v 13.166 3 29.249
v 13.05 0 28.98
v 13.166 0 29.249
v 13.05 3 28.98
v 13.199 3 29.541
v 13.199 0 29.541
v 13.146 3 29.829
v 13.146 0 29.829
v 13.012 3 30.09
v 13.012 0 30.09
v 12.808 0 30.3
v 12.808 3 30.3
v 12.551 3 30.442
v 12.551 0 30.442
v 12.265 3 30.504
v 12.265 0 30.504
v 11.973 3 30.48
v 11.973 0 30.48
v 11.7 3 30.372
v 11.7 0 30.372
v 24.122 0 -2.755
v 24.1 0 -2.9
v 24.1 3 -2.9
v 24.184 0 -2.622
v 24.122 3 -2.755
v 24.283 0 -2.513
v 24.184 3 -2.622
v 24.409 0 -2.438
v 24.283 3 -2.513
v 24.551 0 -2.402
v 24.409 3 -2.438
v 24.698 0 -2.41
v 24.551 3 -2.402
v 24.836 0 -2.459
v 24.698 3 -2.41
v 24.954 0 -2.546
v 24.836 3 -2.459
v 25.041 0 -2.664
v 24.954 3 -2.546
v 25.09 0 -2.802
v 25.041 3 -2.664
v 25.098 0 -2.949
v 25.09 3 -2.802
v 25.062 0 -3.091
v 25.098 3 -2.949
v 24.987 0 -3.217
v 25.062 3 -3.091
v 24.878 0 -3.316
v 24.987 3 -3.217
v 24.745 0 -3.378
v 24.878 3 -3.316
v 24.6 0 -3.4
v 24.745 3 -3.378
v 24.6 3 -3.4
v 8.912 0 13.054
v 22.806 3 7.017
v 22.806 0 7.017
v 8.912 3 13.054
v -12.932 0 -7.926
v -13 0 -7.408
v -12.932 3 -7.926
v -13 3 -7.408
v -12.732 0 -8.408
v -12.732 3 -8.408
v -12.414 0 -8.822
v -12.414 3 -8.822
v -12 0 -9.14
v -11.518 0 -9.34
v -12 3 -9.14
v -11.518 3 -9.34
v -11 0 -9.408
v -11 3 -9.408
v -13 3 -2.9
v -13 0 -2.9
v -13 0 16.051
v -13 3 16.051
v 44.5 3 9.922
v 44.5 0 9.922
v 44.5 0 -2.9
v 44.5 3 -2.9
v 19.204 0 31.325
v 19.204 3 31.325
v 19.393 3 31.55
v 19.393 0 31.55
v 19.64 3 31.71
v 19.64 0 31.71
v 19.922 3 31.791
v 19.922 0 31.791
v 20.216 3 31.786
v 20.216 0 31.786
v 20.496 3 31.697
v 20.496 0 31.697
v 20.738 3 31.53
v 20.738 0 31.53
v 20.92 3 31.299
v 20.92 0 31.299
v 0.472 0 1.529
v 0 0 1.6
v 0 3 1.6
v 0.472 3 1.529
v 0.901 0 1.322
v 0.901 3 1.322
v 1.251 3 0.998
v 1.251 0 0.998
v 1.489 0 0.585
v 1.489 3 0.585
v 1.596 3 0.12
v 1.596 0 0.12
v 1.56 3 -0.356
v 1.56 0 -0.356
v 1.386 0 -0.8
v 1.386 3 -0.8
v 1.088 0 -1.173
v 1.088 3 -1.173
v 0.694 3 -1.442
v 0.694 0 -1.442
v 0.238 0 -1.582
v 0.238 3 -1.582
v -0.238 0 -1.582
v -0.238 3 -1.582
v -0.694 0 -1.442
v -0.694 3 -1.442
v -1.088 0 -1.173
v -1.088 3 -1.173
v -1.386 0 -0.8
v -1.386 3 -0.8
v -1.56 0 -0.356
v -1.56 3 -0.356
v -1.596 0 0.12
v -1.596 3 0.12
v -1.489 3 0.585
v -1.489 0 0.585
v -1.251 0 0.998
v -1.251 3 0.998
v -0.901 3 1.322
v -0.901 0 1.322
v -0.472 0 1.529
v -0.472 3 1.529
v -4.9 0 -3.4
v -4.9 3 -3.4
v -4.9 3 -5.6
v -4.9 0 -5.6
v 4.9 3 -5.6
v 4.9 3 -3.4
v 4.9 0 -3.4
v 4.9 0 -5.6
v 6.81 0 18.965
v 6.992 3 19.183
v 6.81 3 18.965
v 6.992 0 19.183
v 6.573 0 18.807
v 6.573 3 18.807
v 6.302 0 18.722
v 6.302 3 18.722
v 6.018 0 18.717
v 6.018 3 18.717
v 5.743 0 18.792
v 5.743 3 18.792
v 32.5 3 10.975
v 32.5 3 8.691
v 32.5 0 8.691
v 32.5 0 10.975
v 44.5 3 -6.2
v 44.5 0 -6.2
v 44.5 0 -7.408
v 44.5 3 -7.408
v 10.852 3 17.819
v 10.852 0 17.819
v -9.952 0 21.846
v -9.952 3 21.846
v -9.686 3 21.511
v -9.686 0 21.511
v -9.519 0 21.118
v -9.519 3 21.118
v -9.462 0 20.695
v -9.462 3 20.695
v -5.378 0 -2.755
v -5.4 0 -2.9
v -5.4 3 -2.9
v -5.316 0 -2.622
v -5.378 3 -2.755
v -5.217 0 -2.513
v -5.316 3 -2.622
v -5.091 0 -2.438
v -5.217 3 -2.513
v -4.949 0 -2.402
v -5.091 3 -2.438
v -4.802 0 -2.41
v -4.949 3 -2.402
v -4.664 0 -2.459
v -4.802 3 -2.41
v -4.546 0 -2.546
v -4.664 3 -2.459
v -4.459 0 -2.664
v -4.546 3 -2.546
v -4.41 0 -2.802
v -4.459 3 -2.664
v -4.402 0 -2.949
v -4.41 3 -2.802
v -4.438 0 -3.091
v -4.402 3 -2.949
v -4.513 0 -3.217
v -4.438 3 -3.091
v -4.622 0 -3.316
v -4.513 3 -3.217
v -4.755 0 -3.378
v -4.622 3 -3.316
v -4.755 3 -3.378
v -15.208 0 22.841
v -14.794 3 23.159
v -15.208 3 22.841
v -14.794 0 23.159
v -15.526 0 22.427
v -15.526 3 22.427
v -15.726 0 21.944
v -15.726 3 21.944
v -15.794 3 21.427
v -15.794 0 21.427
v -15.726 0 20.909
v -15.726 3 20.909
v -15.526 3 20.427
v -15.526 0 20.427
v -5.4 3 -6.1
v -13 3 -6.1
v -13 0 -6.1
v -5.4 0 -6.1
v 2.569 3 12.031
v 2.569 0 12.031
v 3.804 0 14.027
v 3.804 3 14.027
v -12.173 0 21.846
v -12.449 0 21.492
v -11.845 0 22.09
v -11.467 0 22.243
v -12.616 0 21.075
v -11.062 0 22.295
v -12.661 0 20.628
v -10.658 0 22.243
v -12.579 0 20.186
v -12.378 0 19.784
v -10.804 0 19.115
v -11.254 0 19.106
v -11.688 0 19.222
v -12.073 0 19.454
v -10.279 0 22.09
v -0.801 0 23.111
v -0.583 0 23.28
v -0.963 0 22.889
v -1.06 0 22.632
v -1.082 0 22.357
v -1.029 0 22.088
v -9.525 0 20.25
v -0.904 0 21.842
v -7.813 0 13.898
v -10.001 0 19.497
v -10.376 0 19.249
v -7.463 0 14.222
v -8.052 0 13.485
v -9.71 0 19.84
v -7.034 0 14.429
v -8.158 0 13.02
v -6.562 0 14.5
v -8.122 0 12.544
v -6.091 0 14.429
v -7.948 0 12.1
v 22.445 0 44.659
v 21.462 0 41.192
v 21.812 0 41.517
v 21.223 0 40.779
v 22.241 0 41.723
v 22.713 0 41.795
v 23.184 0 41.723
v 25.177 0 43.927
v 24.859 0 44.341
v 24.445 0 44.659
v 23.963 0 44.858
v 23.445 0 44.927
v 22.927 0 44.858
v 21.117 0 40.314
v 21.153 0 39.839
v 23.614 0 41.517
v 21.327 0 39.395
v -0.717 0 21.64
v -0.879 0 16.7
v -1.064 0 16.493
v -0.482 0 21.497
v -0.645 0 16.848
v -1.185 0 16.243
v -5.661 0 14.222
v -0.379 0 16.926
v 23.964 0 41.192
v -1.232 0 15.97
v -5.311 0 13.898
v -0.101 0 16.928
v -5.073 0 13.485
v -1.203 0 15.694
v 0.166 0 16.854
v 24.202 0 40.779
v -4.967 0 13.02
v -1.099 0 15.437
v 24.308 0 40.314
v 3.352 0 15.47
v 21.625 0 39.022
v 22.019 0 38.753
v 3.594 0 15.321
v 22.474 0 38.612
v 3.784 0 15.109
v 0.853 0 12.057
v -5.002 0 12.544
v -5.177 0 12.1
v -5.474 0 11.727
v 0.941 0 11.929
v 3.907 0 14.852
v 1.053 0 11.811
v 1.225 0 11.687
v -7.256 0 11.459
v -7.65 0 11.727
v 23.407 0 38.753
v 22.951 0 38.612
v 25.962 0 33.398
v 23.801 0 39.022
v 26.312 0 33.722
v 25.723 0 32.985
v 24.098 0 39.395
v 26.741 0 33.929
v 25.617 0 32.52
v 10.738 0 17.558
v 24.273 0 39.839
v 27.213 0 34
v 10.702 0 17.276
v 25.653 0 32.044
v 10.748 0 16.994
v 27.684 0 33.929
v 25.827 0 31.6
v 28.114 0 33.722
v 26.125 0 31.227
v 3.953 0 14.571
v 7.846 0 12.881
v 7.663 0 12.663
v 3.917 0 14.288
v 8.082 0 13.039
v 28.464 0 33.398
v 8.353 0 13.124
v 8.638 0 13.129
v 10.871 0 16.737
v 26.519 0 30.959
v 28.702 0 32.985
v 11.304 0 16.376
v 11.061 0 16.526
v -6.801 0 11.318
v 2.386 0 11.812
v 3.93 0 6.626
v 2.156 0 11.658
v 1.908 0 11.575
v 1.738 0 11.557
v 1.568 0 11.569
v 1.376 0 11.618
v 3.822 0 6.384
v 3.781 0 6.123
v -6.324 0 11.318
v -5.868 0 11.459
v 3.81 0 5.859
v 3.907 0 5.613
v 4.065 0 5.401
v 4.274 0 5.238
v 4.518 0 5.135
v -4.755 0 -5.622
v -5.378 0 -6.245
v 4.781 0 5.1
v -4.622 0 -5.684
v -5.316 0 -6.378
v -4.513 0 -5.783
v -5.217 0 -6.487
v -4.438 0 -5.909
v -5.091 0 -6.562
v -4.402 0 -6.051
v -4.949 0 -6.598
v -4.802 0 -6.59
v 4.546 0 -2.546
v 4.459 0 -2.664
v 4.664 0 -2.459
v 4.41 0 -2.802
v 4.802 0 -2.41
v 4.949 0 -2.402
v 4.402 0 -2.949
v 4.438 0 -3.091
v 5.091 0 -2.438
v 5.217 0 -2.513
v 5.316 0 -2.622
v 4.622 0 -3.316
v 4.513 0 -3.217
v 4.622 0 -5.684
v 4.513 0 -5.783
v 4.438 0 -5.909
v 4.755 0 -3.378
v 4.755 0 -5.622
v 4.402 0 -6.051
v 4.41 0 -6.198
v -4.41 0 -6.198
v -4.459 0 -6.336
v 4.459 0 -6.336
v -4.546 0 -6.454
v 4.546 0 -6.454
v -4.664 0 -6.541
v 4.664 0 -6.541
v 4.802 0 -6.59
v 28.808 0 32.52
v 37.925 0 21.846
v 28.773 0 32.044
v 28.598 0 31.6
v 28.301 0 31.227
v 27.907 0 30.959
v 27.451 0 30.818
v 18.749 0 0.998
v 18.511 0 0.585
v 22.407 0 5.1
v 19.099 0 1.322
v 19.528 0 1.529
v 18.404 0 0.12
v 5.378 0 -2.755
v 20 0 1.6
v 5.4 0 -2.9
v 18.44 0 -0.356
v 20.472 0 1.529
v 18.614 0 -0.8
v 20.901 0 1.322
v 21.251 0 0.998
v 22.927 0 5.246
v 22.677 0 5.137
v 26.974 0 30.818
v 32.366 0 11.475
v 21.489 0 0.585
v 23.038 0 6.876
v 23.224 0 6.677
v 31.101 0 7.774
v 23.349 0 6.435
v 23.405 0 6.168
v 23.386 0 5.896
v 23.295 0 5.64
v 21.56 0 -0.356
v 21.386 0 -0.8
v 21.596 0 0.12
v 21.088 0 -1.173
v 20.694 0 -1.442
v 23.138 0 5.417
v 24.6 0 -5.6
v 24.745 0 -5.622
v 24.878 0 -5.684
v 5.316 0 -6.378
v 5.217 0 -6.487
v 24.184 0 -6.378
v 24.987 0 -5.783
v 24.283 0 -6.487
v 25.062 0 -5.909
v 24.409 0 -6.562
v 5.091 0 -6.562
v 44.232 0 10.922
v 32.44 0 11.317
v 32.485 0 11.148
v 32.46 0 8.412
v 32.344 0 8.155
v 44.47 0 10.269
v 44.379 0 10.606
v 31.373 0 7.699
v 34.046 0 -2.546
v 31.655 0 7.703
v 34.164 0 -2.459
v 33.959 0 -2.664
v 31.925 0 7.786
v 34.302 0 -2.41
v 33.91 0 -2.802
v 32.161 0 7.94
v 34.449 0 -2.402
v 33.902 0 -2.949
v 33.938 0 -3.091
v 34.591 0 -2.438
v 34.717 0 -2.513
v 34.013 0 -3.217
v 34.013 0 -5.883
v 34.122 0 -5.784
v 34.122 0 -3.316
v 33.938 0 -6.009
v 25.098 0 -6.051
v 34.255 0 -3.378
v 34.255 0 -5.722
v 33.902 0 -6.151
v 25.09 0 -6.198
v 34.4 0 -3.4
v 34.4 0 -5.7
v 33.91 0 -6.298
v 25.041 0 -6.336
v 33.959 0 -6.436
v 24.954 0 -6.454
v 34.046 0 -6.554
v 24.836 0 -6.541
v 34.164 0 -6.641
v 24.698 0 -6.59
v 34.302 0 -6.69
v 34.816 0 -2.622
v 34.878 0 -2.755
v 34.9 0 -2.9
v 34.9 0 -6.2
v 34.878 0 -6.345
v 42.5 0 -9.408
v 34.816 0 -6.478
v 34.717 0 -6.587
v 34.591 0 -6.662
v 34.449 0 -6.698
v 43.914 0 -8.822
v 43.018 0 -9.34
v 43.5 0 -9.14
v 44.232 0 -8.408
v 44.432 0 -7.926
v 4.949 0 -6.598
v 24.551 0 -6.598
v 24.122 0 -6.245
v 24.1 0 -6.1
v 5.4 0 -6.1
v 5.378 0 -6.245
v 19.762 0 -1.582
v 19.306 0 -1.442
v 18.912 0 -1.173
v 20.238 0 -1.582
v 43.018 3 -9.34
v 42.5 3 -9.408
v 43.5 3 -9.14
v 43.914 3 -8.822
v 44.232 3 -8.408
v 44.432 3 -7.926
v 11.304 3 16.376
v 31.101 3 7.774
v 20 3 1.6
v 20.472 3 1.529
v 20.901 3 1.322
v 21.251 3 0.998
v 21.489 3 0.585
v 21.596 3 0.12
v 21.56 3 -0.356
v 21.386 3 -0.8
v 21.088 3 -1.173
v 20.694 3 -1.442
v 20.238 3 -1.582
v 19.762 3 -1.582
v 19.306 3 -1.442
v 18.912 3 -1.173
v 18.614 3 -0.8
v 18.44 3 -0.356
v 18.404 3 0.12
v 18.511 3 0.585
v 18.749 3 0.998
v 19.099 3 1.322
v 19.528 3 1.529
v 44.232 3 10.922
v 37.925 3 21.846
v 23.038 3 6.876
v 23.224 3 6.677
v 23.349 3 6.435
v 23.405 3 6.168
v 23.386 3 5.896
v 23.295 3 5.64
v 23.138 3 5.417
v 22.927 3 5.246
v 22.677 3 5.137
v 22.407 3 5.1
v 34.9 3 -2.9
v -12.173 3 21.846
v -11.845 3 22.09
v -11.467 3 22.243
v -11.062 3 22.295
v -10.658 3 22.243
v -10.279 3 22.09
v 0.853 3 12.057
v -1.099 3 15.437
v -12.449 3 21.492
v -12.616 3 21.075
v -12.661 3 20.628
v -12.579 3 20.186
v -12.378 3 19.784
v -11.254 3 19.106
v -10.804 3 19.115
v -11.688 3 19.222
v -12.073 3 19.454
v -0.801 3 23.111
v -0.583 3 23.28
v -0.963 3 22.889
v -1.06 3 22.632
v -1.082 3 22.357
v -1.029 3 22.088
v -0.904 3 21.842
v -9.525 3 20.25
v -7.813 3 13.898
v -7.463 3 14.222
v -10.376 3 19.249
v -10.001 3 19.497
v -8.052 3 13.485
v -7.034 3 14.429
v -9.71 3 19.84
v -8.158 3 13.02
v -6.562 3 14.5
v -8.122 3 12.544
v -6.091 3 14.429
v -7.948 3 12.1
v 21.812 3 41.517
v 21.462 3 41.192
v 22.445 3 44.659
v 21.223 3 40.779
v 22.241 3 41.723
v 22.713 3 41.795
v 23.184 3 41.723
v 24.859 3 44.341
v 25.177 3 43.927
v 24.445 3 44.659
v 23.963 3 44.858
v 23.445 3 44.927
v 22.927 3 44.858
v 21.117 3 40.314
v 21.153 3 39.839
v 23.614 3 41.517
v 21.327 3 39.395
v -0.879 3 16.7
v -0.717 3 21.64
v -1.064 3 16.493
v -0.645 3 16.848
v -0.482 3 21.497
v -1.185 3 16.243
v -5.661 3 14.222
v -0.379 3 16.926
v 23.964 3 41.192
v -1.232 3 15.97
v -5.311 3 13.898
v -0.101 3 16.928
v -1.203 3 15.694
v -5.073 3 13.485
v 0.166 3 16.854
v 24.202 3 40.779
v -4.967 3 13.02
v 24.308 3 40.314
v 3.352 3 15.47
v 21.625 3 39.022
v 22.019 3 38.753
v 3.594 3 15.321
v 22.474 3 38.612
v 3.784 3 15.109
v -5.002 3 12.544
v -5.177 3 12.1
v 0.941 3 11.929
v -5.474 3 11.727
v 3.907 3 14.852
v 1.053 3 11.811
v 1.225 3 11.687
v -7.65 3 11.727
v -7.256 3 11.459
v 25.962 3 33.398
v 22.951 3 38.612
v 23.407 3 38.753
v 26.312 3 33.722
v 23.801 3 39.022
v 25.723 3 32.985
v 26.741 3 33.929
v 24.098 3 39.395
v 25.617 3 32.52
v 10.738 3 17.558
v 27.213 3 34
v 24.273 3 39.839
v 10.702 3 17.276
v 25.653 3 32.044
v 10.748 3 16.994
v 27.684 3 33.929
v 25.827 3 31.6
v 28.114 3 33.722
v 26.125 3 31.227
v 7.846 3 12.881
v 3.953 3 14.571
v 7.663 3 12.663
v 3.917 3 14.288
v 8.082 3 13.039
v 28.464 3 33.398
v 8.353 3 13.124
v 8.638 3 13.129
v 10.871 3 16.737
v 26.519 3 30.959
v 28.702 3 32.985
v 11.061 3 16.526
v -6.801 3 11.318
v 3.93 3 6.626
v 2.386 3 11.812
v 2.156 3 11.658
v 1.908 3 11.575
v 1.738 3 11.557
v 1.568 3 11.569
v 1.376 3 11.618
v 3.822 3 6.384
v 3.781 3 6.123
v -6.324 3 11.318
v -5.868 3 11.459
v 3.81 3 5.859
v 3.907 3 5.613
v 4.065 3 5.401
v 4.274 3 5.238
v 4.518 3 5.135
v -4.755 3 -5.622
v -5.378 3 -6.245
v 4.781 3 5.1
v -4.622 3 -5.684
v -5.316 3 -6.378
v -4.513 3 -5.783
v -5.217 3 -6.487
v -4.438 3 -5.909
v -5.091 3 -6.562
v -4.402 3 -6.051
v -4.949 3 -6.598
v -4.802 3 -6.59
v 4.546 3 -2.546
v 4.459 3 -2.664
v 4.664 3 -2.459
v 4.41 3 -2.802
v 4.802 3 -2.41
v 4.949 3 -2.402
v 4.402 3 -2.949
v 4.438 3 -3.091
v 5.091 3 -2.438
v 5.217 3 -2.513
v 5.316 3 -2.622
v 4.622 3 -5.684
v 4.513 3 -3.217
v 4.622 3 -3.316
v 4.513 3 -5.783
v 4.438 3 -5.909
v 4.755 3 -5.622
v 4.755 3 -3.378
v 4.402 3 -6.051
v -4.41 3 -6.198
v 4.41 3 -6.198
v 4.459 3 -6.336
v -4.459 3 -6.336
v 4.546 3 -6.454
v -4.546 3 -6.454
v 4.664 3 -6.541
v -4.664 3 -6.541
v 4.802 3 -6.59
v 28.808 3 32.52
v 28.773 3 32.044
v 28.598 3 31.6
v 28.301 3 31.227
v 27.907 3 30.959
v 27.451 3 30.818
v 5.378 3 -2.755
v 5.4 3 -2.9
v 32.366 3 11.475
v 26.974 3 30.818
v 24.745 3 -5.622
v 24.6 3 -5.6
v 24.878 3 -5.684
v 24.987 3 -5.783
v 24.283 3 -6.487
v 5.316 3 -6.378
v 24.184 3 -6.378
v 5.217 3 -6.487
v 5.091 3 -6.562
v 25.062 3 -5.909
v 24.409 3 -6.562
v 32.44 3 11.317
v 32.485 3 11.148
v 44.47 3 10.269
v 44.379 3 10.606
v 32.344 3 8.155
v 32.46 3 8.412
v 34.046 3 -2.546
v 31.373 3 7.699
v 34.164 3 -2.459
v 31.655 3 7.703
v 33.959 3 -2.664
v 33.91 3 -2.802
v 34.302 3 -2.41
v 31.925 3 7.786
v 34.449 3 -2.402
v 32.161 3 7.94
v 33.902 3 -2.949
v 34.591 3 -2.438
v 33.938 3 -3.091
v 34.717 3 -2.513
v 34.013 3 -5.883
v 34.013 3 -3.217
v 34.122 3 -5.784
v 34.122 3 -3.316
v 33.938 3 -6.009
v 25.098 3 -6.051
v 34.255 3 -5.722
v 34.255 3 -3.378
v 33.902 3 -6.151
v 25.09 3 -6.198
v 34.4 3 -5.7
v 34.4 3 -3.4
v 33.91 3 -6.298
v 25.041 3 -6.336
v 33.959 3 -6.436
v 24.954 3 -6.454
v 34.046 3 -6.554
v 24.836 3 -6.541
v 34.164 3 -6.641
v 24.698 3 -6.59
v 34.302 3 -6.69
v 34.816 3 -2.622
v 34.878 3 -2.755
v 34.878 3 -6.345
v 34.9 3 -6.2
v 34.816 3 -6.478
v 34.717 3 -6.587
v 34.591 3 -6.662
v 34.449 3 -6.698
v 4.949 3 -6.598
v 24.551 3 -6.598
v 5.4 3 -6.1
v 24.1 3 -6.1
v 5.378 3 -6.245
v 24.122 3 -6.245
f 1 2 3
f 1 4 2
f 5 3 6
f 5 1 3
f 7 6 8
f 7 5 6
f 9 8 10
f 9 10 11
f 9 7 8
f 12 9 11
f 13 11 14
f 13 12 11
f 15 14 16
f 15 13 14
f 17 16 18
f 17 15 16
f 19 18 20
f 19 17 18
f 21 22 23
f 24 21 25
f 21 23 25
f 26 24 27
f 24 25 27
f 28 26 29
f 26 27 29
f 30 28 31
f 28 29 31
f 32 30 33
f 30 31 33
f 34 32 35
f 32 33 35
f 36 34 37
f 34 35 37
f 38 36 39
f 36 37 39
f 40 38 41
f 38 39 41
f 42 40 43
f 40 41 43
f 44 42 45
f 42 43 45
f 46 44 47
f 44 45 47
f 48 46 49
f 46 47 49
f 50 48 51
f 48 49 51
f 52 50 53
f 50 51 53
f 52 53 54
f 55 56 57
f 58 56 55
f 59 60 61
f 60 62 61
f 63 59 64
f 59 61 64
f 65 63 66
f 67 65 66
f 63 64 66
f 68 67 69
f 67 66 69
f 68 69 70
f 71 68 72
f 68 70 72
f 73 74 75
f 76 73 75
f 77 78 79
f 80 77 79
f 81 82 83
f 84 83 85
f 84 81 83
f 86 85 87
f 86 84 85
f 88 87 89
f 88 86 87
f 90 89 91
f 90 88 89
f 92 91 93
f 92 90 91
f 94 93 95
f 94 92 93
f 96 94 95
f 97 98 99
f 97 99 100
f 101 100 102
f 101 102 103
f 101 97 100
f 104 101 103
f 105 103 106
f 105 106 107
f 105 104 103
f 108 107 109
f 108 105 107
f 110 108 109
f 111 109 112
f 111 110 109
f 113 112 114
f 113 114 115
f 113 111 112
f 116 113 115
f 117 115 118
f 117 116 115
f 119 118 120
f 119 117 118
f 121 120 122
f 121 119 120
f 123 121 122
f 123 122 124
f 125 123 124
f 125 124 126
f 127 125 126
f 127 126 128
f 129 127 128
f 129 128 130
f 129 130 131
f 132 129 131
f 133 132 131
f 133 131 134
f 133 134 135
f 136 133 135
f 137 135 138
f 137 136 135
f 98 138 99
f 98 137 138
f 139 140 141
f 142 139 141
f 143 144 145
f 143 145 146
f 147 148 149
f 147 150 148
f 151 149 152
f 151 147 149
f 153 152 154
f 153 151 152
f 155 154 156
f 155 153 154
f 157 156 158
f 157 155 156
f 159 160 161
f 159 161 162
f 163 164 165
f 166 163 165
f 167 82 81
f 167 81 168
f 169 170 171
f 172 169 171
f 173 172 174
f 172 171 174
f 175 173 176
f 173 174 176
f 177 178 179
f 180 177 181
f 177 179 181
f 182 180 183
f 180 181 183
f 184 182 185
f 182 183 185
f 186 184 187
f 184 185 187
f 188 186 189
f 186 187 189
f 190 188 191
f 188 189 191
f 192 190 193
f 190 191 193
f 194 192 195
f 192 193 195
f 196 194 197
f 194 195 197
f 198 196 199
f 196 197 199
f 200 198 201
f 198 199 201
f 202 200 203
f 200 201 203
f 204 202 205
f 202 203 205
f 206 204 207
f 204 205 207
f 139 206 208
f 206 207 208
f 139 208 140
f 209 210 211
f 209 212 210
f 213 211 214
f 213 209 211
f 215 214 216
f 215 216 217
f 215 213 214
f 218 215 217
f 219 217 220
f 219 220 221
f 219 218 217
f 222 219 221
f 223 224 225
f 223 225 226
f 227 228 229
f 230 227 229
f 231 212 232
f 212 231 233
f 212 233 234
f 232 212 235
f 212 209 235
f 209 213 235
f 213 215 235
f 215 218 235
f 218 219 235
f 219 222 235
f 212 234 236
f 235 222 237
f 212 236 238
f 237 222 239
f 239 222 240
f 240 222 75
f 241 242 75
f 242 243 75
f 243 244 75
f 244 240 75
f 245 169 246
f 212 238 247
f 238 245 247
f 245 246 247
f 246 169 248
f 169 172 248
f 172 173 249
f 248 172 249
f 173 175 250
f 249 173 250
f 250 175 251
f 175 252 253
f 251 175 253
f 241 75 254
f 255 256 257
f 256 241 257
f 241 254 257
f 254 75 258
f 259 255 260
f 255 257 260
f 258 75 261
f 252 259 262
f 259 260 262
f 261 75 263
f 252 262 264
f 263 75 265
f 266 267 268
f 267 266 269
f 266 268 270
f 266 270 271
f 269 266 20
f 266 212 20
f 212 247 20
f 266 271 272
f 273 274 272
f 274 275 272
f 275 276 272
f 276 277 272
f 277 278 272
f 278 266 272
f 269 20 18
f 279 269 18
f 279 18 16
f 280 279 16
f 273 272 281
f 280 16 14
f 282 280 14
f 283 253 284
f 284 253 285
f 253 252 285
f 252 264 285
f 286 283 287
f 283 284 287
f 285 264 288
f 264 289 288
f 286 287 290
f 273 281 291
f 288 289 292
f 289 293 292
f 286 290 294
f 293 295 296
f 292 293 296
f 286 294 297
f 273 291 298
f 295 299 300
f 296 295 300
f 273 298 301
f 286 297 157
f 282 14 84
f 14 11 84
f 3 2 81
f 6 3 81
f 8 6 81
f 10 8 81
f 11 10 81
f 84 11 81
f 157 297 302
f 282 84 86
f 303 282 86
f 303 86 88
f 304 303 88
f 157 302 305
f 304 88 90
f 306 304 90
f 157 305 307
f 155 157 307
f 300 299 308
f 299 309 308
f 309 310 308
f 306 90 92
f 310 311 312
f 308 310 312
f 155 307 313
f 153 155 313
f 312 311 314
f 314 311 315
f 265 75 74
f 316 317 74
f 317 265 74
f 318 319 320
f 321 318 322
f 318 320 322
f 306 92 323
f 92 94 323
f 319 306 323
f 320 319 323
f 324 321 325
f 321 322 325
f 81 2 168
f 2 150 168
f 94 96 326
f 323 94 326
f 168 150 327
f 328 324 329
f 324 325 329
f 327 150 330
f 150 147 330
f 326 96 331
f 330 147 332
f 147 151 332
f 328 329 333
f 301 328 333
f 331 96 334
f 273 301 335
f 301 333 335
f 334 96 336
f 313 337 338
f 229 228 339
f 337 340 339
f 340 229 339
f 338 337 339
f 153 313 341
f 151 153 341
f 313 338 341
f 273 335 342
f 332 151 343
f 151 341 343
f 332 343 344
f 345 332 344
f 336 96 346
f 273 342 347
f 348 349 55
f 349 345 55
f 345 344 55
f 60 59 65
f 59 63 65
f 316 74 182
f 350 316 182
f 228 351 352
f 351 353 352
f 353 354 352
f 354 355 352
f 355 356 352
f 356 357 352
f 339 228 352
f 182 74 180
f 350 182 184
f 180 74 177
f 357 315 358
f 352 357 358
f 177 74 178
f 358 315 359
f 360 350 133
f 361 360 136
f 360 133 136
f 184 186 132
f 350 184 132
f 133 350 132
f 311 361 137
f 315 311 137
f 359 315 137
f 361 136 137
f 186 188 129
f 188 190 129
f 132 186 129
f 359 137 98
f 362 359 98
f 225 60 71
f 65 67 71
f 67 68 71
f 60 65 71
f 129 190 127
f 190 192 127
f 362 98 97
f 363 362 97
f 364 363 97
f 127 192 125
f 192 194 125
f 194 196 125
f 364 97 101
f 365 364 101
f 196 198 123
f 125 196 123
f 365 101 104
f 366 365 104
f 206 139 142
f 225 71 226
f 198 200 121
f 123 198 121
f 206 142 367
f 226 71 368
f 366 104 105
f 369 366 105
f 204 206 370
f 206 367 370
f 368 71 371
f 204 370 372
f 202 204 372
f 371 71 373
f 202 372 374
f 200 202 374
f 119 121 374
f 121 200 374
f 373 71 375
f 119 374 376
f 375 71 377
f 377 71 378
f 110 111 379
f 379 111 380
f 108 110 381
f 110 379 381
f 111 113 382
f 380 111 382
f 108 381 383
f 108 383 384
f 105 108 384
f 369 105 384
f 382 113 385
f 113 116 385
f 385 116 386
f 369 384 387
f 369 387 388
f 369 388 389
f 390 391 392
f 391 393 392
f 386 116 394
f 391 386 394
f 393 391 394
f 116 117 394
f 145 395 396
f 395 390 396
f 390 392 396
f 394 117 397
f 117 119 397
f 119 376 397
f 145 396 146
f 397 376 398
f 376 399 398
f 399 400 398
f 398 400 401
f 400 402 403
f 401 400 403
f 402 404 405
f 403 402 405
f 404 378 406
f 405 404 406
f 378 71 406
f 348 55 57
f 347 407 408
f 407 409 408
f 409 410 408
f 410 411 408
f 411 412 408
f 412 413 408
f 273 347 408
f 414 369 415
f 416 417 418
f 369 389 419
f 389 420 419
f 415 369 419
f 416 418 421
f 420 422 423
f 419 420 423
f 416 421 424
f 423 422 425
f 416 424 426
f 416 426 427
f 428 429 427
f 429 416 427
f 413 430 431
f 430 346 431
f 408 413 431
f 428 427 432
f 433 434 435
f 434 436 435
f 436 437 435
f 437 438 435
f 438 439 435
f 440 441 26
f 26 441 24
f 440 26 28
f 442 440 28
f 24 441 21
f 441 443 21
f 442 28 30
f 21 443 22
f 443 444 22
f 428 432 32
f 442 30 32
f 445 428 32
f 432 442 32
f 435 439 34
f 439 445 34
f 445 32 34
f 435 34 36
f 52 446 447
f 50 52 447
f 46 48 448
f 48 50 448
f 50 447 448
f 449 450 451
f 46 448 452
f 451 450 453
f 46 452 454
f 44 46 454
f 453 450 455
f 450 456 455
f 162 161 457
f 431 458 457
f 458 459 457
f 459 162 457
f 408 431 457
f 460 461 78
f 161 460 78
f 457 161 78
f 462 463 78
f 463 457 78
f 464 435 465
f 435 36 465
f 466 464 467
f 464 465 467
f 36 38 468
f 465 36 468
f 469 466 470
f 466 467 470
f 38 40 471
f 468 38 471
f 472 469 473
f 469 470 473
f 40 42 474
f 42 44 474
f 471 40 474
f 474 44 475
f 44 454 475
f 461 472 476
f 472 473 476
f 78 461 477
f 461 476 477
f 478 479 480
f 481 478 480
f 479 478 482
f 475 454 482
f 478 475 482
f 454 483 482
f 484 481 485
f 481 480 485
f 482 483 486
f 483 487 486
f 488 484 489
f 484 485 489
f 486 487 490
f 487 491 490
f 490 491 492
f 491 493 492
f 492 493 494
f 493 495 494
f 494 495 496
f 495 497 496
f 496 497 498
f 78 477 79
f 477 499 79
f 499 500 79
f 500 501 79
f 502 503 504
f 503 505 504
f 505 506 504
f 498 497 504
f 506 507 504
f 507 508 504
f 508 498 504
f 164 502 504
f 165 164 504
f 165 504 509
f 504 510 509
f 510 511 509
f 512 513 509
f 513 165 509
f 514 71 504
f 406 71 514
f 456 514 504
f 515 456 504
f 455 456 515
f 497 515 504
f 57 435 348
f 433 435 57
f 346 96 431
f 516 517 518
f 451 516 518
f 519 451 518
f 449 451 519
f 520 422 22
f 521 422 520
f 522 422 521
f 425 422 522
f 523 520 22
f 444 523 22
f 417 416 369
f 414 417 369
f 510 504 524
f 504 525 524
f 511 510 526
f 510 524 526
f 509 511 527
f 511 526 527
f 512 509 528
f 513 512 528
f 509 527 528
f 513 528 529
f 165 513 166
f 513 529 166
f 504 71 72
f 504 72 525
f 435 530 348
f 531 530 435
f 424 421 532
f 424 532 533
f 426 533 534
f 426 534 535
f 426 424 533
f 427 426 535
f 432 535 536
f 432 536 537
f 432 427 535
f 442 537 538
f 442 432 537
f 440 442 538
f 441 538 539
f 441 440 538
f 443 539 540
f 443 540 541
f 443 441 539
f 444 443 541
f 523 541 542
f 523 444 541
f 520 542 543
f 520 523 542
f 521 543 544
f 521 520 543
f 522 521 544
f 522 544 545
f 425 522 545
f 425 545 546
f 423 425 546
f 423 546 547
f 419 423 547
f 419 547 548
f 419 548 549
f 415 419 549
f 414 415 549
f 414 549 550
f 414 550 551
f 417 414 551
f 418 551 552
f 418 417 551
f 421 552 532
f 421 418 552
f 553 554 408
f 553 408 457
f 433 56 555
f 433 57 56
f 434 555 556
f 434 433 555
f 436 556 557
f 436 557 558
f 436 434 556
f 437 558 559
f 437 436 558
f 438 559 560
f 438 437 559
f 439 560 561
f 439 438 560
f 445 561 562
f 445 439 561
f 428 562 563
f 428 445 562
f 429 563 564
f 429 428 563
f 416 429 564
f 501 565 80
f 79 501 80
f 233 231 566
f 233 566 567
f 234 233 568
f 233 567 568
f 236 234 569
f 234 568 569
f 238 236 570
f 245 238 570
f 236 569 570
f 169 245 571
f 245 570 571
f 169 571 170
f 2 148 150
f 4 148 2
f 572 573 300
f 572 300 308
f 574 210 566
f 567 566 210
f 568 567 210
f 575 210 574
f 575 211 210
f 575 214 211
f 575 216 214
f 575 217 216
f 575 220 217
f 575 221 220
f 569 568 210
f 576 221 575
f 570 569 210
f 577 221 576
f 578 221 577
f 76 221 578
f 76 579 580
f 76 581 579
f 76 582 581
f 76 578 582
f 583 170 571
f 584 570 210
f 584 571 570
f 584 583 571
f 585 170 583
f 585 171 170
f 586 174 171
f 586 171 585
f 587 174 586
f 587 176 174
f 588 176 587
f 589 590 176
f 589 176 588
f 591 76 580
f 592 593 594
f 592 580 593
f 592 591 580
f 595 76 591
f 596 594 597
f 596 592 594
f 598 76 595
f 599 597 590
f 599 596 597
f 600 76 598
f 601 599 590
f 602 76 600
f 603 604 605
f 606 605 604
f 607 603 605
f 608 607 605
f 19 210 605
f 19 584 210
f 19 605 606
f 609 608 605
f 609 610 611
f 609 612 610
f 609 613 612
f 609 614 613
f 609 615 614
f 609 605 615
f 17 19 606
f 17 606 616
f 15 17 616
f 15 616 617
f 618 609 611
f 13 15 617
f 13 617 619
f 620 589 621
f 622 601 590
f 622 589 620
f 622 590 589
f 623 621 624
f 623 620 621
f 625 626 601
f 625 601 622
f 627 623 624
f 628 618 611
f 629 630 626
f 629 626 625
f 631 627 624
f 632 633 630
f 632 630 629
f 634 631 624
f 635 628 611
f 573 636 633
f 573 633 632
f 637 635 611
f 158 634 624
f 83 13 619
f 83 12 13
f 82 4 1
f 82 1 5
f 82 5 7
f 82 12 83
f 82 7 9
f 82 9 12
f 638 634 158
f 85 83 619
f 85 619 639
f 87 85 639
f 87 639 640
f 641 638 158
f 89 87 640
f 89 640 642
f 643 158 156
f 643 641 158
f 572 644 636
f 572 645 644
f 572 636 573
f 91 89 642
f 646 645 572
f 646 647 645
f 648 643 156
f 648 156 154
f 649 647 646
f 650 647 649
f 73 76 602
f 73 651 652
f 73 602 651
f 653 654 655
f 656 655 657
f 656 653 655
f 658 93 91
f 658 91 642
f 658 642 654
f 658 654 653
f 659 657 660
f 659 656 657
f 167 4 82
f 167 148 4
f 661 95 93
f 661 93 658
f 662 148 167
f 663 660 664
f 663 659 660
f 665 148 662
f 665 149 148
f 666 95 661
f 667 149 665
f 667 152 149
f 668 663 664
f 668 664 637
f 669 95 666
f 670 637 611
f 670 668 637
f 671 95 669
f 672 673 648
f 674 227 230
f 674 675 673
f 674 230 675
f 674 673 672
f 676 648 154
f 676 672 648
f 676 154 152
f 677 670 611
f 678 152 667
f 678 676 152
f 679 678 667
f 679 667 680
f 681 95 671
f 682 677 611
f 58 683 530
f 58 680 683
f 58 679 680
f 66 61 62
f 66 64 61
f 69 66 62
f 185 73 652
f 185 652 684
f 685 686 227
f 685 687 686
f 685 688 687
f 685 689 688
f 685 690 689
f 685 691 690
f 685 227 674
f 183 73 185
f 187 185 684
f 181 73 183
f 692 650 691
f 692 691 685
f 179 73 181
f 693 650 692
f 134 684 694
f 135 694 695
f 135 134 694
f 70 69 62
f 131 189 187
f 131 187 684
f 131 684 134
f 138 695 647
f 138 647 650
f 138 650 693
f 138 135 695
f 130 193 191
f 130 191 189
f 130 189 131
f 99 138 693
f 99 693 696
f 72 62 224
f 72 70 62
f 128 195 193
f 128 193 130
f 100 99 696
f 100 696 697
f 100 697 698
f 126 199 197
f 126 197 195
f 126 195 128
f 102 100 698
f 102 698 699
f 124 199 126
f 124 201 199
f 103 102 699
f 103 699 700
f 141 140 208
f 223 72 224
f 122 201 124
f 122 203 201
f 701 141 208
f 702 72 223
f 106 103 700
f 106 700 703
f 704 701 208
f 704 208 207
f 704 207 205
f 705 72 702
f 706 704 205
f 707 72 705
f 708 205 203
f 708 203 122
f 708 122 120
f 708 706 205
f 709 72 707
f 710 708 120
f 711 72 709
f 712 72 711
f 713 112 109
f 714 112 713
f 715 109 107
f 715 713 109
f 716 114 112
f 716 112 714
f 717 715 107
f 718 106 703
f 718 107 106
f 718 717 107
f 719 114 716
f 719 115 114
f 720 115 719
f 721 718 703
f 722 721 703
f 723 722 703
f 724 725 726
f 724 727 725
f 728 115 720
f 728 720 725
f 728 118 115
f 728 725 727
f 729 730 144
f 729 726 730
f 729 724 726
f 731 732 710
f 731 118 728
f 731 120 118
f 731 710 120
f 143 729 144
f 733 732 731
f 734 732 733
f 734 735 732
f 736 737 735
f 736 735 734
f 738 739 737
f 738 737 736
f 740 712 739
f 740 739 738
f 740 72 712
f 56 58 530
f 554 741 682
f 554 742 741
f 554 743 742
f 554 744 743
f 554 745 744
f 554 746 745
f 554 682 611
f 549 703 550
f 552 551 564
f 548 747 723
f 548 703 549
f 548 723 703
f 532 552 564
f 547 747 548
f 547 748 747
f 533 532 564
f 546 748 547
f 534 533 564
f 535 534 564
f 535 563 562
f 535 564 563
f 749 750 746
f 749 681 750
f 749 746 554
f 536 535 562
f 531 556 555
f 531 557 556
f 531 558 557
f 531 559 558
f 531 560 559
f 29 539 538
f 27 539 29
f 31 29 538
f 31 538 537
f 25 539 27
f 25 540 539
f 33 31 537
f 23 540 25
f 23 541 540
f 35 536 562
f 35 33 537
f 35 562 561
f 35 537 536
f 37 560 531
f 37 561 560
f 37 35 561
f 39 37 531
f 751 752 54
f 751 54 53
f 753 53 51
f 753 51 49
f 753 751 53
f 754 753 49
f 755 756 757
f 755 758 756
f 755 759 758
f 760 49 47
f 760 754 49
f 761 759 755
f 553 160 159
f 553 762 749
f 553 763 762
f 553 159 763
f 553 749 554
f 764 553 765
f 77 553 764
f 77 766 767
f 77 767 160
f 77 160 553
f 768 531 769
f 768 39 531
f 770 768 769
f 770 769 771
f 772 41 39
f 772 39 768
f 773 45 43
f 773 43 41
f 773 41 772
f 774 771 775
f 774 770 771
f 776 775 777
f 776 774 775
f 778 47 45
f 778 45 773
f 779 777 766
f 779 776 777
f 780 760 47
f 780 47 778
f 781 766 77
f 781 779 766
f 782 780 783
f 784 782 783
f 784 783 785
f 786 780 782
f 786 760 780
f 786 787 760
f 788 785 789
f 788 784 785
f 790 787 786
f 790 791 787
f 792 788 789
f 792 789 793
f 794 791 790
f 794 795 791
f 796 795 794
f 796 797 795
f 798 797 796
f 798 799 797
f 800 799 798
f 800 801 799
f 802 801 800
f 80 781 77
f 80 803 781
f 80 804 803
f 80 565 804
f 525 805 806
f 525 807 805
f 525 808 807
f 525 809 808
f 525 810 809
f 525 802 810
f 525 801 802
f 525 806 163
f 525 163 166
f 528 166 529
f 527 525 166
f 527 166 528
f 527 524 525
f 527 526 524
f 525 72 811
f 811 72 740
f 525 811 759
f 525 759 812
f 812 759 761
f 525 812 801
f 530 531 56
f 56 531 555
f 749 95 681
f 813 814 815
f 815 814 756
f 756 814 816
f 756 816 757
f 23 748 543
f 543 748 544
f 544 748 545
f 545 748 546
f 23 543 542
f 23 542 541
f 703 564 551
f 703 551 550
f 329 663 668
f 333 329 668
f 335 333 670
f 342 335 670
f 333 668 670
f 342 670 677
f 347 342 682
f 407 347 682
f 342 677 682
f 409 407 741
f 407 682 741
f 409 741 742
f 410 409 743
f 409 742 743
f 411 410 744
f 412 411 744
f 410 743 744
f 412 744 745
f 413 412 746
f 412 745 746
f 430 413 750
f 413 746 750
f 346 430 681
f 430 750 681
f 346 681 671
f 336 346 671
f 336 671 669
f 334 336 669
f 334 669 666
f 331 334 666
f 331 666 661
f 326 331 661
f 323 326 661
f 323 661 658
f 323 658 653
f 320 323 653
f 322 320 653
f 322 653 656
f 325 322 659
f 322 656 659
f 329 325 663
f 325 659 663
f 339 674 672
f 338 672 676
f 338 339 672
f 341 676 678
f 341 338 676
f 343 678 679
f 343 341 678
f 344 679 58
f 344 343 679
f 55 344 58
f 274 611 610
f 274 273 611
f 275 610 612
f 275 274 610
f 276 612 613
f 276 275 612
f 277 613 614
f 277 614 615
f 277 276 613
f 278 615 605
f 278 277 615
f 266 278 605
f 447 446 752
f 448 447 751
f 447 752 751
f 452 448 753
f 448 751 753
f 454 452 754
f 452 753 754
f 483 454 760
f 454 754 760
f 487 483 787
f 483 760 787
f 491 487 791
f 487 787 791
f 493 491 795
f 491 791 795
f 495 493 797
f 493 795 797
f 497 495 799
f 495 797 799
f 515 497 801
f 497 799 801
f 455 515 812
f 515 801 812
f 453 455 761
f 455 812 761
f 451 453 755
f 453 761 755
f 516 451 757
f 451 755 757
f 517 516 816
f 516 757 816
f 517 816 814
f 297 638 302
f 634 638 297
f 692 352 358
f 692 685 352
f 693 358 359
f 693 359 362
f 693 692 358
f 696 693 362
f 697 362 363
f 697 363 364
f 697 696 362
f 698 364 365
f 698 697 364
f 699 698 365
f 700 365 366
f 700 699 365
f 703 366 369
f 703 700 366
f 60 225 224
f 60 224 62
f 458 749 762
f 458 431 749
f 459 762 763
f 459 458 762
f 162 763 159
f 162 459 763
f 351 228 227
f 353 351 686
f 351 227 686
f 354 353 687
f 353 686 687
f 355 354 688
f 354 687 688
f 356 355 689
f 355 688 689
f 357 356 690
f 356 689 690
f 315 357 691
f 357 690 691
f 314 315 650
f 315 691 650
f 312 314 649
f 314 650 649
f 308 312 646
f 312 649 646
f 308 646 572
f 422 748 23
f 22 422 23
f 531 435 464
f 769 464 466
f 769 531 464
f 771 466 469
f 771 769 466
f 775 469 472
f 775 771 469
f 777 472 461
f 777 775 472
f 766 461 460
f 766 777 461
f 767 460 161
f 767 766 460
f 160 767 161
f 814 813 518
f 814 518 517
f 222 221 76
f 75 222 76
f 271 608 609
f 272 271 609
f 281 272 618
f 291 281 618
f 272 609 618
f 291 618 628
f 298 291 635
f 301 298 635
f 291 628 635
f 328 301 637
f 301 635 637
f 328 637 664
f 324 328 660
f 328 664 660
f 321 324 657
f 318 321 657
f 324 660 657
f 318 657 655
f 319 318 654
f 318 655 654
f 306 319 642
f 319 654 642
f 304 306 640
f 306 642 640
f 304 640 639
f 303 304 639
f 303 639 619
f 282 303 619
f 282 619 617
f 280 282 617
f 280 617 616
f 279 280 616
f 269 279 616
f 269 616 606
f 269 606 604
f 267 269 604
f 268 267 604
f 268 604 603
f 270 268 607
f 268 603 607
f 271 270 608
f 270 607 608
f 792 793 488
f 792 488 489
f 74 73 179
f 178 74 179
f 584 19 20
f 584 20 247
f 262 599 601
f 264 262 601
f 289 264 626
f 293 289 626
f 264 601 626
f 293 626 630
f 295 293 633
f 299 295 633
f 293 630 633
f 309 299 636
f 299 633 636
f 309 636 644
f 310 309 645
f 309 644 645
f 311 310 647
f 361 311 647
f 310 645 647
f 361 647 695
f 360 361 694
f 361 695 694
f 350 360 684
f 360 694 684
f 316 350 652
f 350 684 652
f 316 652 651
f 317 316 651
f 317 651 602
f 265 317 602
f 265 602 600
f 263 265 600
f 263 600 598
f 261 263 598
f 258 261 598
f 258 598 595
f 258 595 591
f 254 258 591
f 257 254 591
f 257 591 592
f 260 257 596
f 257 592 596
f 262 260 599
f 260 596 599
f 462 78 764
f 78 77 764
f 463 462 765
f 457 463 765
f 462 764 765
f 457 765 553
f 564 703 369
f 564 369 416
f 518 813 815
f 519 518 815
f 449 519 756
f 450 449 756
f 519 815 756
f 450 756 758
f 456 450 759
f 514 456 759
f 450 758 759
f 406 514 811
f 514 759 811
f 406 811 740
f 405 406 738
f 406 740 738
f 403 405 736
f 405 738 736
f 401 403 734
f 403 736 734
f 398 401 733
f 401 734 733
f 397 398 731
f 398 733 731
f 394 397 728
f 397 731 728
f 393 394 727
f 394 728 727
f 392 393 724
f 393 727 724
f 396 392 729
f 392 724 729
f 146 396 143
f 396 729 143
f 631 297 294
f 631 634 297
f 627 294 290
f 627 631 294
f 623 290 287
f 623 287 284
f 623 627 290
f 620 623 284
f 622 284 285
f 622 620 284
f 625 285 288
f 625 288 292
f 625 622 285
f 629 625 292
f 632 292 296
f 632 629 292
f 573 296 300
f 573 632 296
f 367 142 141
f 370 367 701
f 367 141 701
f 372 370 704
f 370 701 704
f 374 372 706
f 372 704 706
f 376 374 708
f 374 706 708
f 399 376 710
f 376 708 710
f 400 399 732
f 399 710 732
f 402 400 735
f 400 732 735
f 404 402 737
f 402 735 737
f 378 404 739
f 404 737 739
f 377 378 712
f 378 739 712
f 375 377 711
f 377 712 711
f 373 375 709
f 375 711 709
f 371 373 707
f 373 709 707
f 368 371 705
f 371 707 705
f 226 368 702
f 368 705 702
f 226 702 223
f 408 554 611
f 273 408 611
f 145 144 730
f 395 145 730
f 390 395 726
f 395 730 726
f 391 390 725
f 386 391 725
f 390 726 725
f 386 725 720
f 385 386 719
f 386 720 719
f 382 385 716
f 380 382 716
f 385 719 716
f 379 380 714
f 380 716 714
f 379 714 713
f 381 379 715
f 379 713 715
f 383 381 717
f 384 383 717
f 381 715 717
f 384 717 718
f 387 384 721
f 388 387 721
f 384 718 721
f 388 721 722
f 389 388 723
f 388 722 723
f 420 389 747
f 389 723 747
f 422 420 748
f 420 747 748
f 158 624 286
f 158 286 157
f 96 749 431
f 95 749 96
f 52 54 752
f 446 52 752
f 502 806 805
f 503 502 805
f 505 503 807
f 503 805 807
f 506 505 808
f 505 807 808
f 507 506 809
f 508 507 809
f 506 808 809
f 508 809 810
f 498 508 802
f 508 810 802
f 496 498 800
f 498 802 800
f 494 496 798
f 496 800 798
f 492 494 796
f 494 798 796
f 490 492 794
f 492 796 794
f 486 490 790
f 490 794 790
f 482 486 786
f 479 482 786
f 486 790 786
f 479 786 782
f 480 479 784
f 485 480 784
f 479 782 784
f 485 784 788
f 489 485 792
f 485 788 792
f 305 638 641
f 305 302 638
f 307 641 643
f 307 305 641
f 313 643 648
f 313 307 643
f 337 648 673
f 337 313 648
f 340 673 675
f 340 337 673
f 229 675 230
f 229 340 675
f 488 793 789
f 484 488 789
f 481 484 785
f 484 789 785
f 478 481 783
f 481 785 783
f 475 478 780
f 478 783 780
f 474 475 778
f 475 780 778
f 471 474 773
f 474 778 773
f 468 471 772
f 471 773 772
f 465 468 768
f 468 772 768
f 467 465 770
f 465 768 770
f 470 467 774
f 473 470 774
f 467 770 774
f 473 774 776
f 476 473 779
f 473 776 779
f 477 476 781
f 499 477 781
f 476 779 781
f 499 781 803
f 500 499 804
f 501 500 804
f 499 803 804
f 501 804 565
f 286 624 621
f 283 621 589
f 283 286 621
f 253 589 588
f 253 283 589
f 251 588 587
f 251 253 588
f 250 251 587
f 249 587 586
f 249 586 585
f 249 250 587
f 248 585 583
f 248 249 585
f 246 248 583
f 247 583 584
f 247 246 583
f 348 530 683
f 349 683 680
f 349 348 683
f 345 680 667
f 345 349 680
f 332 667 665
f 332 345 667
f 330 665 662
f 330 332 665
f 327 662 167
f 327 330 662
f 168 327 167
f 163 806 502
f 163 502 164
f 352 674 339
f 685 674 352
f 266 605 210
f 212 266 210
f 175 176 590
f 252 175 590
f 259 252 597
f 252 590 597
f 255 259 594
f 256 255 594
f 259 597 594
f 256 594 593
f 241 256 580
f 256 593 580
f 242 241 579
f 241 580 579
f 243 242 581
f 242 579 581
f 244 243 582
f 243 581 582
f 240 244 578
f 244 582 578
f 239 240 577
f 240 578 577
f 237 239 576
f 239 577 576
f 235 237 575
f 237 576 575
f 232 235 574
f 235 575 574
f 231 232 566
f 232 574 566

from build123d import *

# Parameters (mm, degrees)
SKETCH1_W           = 57.5
SKETCH1_H           = 3.408146715
SKETCH1_W_2         = 10
SKETCH1_H_2         = 3
SKETCH1_R           = 1.6
BOSS_EXTRUDE1_DEPTH = 3
SKETCH3_W           = 8.1
SKETCH3_H           = 3.2
SKETCH3_W_2         = 10.1
SKETCH3_H_2         = 3.3
SKETCH3_W_3         = 19.7
SKETCH3_W_4         = 19.5
SKETCH3_H_3         = 3
CUT_EXTRUDE1_DEPTH  = 3
SKETCH4_R           = 0.5
CUT_EXTRUDE2_DEPTH  = 3
SKETCH6_R           = 1.6
BOSS_EXTRUDE2_DEPTH = 3
SKETCH6_2_R         = 1.6
CUT_EXTRUDE3_DEPTH  = 3
CUT_EXTRUDE4_DEPTH  = 3
FILLET1_R           = 2
CUT_EXTRUDE5_DEPTH  = 3
EXTRUDE_THIN1_DEPTH = 3
FILLET2_R           = 1
BOSS_EXTRUDE3_DEPTH = 3
FILLET3_R           = 1


with BuildPart() as part:
    # Sketch1 → Boss-Extrude1 (new body)
    # profile 1 of 4: a face of its own
    with BuildSketch(Plane(origin=(0, 0, 0), x_dir=(1, 0, 0), z_dir=(0, 1, 0))):
        with Locations((15.75, 7.704073358)):
            Rectangle(SKETCH1_W, SKETCH1_H)
    # profile 2 of 4: a face of its own
    with BuildSketch(Plane(origin=(0, 0, 0), x_dir=(1, 0, 0), z_dir=(0, 1, 0))):
        with Locations((0, 4.5)):
            Rectangle(SKETCH1_W_2, SKETCH1_H_2)
    # profile 3 of 4: a face of its own
    with BuildSketch(Plane(origin=(0, 0, 0), x_dir=(1, 0, 0), z_dir=(0, 1, 0))):
        with Locations((29.5, 4.5)):
            Rectangle(SKETCH1_W_2, SKETCH1_H_2)
    # profile 4 of 4: a face of its own
    with BuildSketch(Plane(origin=(0, 0, 0), x_dir=(1, 0, 0), z_dir=(0, 1, 0))):
        Polygon((5, 3), (-5, 3), (-13, 3), (-13, -21.846492531), (44.5, -21.846492531), (44.5, 3), (34.5, 3), (24.5, 3), align=None)
        with Locations(Location((0, 0, 0), (0, 0, 270))):
            Circle(SKETCH1_R, mode=Mode.SUBTRACT)
        with Locations(Location((20, 0, 0), (0, 0, 270))):
            Circle(SKETCH1_R, mode=Mode.SUBTRACT)
    extrude(amount=BOSS_EXTRUDE1_DEPTH)

    # Sketch3 → Cut-Extrude1 (cut)
    # profile 1 of 3: a face of its own
    with BuildSketch(Plane(origin=(0, 3, 0), x_dir=(1, 0, 0), z_dir=(0, 1, 0))):
        with Locations((-8.95, 4.5)):
            Rectangle(SKETCH3_W, SKETCH3_H)
    # profile 2 of 3: a face of its own
    with BuildSketch(Plane(origin=(0, 3, 0), x_dir=(1, 0, 0), z_dir=(0, 1, 0))):
        with Locations((39.45, 4.55)):
            Rectangle(SKETCH3_W_2, SKETCH3_H_2)
    # profile 3 of 3: a face of its own
    with BuildSketch(Plane(origin=(0, 3, 0), x_dir=(1, 0, 0), z_dir=(0, 1, 0))):
        with Locations((14.75, 4.5)):
            Rectangle(SKETCH3_W_3, SKETCH3_H)
        with Locations((14.75, 4.5)):
            Rectangle(SKETCH3_W_4, SKETCH3_H_3, mode=Mode.SUBTRACT)
    extrude(amount=-CUT_EXTRUDE1_DEPTH, mode=Mode.SUBTRACT)

    # Sketch4 → Cut-Extrude2 (cut)
    with BuildSketch(Plane(origin=(0, 3, 0), x_dir=(1, 0, 0), z_dir=(0, 1, 0))):
        with Locations((-4.9, 6.1)):
            Circle(SKETCH4_R)
        with Locations((-4.9, 2.9)):
            Circle(SKETCH4_R)
        with Locations((4.9, 6.1)):
            Circle(SKETCH4_R)
        with Locations((4.9, 2.9)):
            Circle(SKETCH4_R)
        with Locations((24.6, 6.1)):
            Circle(SKETCH4_R)
        with Locations((24.6, 2.9)):
            Circle(SKETCH4_R)
        with Locations((34.4, 2.9)):
            Circle(SKETCH4_R)
        with Locations((34.4, 6.2)):
            Circle(SKETCH4_R)
    extrude(amount=-CUT_EXTRUDE2_DEPTH, mode=Mode.SUBTRACT)

    # Sketch6 → Boss-Extrude2 (add)
    with BuildSketch(Plane(origin=(0, 3, 0), x_dir=(1, 0, 0), z_dir=(0, 1, 0))):
        Polygon((-6.176738334, -4.232762247), (37.924895048, -21.846492531), (24.176946138, -45.658638544), (-16.52624784, -22.158638544), align=None)
        with Locations(Location((22.712844523, -40.194536929, 0), (0, 0, 270))):
            Circle(SKETCH6_R, mode=Mode.SUBTRACT)
        with Locations(Location((27.212844523, -32.400308295, 0), (0, 0, 270))):
            Circle(SKETCH6_R, mode=Mode.SUBTRACT)
        with Locations((-11.062146225, -20.694536929)):
            Circle(SKETCH6_R, mode=Mode.SUBTRACT)
        with Locations((-6.562146225, -12.900308295)):
            Circle(SKETCH6_R, mode=Mode.SUBTRACT)
    extrude(amount=-BOSS_EXTRUDE2_DEPTH)

    # Sketch6<2> → Cut-Extrude3 (cut)
    with BuildSketch(Plane(origin=(0, 3, 0), x_dir=(1, 0, 0), z_dir=(0, 1, 0))):
        with Locations(Location((-6.562146225, -12.900308295, 0), (0, 0, 270))):
            Circle(SKETCH6_2_R)
        with BuildLine():
            ThreePointArc((-12.172550786, -21.846492531), (-11.062146225, -22.294536929), (-9.951741663, -21.846492531))
            Line((-9.951741663, -21.846492531), (-12.172550786, -21.846492531))
        make_face()
        with BuildLine():
            Line((-12.172550786, -21.846492531), (-9.951741663, -21.846492531))
            ThreePointArc((-9.951741663, -21.846492531), (-9.589623339, -21.320377444), (-9.462146225, -20.694536929))
            ThreePointArc((-9.462146225, -20.694536929), (-11.68798674, -19.222014043), (-12.172550786, -21.846492531))
        make_face()
    extrude(amount=-CUT_EXTRUDE3_DEPTH, mode=Mode.SUBTRACT)

    # Sketch8 → Cut-Extrude4 (cut)
    with BuildSketch(Plane(origin=(0, 3, 0), x_dir=(1, 0, 0), z_dir=(0, 1, 0))):
        Polygon((37.924895048, -21.846492531), (47.152165502, -5.864391291), (51.952331521, -20.765599638), (44.5, -26.059092388), align=None)
    extrude(amount=-CUT_EXTRUDE4_DEPTH, mode=Mode.SUBTRACT)

    # Fillet1
    fillet1_edges = [part.edges().sort_by_distance(p)[0] for p in [
        (-16.52624784, 1.5, 22.158638544),
        (24.176946138, 1.5, 45.658638544),
        (44.5, 1.5, 10.45807669),
        (-13, 1.5, -9.408146715),
        (44.5, 1.5, -9.408146715),
    ]]
    fillet(fillet1_edges, radius=FILLET1_R)

    # Sketch9 → Cut-Extrude5 (cut)
    with BuildSketch(Plane(origin=(0, 3, 0), x_dir=(1, 0, 0), z_dir=(0, 1, 0))):
        Polygon((1, -5.1), (32.5, -5.1), (32.5, -11.242686381), (19.0166921, -34.596460718), (-4.365993802, -21.096460718), (1, -11.802286819), align=None)
    extrude(amount=-CUT_EXTRUDE5_DEPTH, mode=Mode.SUBTRACT)

    # Sketch10 → Extrude-Thin1 (add)
    with BuildSketch(Plane(origin=(0, 3, 0), x_dir=(1, 0, 0), z_dir=(0, 1, 0))):
        Polygon((-4.02917863, -23.038408895), (33.945296414, -6.53815934), (32.351236334, -2.869512115), (-5.623238711, -19.369761671), align=None)
        Polygon((-1.3111598, -5.755729233), (17.608558315, -36.351129247), (21.010628303, -34.247342235), (2.090910189, -3.651942221), align=None)
    extrude(amount=-EXTRUDE_THIN1_DEPTH)

    # Fillet2
    fillet2_edges = [part.edges().sort_by_distance(p)[0] for p in [
        (1, 1.5, 11.802286819),
        (32.5, 1.5, 11.242686381),
        (15.139105711, 1.5, 32.357735172),
        (-2.302171748, 1.5, 22.288008936),
        (20.083687523, 1.5, 32.748370433),
        (32.5, 1.5, 7.166153578),
        (2.986366531, 1.5, 5.1),
        (27.217883275, 1.5, 5.1),
        (-2.614232793, 1.5, 18.062321647),
        (4.411323294, 1.5, 15.009654597),
        (8.118301247, 1.5, 13.398939472),
        (10.244069028, 1.5, 16.836554938),
        (6.537091075, 1.5, 18.447270063),
    ]]
    fillet(fillet2_edges, radius=FILLET2_R)

    # Sketch11 → Boss-Extrude3 (add)
    with BuildSketch(Plane(origin=(0, 3, 0), x_dir=(1, 0, 0), z_dir=(0, 1, 0))):
        Polygon((0.814899894, -12.122889607), (2.271586452, -9.599834478), (-0.508630479, -8.514382996), align=None)
    extrude(amount=-BOSS_EXTRUDE3_DEPTH)

    # Fillet3
    fillet3_edges = [part.edges().sort_by_distance(p)[0] for p in [
        (1.689467225, 1.5, 10.608094556),
    ]]
    fillet(fillet3_edges, radius=FILLET3_R)


solid = part.part
